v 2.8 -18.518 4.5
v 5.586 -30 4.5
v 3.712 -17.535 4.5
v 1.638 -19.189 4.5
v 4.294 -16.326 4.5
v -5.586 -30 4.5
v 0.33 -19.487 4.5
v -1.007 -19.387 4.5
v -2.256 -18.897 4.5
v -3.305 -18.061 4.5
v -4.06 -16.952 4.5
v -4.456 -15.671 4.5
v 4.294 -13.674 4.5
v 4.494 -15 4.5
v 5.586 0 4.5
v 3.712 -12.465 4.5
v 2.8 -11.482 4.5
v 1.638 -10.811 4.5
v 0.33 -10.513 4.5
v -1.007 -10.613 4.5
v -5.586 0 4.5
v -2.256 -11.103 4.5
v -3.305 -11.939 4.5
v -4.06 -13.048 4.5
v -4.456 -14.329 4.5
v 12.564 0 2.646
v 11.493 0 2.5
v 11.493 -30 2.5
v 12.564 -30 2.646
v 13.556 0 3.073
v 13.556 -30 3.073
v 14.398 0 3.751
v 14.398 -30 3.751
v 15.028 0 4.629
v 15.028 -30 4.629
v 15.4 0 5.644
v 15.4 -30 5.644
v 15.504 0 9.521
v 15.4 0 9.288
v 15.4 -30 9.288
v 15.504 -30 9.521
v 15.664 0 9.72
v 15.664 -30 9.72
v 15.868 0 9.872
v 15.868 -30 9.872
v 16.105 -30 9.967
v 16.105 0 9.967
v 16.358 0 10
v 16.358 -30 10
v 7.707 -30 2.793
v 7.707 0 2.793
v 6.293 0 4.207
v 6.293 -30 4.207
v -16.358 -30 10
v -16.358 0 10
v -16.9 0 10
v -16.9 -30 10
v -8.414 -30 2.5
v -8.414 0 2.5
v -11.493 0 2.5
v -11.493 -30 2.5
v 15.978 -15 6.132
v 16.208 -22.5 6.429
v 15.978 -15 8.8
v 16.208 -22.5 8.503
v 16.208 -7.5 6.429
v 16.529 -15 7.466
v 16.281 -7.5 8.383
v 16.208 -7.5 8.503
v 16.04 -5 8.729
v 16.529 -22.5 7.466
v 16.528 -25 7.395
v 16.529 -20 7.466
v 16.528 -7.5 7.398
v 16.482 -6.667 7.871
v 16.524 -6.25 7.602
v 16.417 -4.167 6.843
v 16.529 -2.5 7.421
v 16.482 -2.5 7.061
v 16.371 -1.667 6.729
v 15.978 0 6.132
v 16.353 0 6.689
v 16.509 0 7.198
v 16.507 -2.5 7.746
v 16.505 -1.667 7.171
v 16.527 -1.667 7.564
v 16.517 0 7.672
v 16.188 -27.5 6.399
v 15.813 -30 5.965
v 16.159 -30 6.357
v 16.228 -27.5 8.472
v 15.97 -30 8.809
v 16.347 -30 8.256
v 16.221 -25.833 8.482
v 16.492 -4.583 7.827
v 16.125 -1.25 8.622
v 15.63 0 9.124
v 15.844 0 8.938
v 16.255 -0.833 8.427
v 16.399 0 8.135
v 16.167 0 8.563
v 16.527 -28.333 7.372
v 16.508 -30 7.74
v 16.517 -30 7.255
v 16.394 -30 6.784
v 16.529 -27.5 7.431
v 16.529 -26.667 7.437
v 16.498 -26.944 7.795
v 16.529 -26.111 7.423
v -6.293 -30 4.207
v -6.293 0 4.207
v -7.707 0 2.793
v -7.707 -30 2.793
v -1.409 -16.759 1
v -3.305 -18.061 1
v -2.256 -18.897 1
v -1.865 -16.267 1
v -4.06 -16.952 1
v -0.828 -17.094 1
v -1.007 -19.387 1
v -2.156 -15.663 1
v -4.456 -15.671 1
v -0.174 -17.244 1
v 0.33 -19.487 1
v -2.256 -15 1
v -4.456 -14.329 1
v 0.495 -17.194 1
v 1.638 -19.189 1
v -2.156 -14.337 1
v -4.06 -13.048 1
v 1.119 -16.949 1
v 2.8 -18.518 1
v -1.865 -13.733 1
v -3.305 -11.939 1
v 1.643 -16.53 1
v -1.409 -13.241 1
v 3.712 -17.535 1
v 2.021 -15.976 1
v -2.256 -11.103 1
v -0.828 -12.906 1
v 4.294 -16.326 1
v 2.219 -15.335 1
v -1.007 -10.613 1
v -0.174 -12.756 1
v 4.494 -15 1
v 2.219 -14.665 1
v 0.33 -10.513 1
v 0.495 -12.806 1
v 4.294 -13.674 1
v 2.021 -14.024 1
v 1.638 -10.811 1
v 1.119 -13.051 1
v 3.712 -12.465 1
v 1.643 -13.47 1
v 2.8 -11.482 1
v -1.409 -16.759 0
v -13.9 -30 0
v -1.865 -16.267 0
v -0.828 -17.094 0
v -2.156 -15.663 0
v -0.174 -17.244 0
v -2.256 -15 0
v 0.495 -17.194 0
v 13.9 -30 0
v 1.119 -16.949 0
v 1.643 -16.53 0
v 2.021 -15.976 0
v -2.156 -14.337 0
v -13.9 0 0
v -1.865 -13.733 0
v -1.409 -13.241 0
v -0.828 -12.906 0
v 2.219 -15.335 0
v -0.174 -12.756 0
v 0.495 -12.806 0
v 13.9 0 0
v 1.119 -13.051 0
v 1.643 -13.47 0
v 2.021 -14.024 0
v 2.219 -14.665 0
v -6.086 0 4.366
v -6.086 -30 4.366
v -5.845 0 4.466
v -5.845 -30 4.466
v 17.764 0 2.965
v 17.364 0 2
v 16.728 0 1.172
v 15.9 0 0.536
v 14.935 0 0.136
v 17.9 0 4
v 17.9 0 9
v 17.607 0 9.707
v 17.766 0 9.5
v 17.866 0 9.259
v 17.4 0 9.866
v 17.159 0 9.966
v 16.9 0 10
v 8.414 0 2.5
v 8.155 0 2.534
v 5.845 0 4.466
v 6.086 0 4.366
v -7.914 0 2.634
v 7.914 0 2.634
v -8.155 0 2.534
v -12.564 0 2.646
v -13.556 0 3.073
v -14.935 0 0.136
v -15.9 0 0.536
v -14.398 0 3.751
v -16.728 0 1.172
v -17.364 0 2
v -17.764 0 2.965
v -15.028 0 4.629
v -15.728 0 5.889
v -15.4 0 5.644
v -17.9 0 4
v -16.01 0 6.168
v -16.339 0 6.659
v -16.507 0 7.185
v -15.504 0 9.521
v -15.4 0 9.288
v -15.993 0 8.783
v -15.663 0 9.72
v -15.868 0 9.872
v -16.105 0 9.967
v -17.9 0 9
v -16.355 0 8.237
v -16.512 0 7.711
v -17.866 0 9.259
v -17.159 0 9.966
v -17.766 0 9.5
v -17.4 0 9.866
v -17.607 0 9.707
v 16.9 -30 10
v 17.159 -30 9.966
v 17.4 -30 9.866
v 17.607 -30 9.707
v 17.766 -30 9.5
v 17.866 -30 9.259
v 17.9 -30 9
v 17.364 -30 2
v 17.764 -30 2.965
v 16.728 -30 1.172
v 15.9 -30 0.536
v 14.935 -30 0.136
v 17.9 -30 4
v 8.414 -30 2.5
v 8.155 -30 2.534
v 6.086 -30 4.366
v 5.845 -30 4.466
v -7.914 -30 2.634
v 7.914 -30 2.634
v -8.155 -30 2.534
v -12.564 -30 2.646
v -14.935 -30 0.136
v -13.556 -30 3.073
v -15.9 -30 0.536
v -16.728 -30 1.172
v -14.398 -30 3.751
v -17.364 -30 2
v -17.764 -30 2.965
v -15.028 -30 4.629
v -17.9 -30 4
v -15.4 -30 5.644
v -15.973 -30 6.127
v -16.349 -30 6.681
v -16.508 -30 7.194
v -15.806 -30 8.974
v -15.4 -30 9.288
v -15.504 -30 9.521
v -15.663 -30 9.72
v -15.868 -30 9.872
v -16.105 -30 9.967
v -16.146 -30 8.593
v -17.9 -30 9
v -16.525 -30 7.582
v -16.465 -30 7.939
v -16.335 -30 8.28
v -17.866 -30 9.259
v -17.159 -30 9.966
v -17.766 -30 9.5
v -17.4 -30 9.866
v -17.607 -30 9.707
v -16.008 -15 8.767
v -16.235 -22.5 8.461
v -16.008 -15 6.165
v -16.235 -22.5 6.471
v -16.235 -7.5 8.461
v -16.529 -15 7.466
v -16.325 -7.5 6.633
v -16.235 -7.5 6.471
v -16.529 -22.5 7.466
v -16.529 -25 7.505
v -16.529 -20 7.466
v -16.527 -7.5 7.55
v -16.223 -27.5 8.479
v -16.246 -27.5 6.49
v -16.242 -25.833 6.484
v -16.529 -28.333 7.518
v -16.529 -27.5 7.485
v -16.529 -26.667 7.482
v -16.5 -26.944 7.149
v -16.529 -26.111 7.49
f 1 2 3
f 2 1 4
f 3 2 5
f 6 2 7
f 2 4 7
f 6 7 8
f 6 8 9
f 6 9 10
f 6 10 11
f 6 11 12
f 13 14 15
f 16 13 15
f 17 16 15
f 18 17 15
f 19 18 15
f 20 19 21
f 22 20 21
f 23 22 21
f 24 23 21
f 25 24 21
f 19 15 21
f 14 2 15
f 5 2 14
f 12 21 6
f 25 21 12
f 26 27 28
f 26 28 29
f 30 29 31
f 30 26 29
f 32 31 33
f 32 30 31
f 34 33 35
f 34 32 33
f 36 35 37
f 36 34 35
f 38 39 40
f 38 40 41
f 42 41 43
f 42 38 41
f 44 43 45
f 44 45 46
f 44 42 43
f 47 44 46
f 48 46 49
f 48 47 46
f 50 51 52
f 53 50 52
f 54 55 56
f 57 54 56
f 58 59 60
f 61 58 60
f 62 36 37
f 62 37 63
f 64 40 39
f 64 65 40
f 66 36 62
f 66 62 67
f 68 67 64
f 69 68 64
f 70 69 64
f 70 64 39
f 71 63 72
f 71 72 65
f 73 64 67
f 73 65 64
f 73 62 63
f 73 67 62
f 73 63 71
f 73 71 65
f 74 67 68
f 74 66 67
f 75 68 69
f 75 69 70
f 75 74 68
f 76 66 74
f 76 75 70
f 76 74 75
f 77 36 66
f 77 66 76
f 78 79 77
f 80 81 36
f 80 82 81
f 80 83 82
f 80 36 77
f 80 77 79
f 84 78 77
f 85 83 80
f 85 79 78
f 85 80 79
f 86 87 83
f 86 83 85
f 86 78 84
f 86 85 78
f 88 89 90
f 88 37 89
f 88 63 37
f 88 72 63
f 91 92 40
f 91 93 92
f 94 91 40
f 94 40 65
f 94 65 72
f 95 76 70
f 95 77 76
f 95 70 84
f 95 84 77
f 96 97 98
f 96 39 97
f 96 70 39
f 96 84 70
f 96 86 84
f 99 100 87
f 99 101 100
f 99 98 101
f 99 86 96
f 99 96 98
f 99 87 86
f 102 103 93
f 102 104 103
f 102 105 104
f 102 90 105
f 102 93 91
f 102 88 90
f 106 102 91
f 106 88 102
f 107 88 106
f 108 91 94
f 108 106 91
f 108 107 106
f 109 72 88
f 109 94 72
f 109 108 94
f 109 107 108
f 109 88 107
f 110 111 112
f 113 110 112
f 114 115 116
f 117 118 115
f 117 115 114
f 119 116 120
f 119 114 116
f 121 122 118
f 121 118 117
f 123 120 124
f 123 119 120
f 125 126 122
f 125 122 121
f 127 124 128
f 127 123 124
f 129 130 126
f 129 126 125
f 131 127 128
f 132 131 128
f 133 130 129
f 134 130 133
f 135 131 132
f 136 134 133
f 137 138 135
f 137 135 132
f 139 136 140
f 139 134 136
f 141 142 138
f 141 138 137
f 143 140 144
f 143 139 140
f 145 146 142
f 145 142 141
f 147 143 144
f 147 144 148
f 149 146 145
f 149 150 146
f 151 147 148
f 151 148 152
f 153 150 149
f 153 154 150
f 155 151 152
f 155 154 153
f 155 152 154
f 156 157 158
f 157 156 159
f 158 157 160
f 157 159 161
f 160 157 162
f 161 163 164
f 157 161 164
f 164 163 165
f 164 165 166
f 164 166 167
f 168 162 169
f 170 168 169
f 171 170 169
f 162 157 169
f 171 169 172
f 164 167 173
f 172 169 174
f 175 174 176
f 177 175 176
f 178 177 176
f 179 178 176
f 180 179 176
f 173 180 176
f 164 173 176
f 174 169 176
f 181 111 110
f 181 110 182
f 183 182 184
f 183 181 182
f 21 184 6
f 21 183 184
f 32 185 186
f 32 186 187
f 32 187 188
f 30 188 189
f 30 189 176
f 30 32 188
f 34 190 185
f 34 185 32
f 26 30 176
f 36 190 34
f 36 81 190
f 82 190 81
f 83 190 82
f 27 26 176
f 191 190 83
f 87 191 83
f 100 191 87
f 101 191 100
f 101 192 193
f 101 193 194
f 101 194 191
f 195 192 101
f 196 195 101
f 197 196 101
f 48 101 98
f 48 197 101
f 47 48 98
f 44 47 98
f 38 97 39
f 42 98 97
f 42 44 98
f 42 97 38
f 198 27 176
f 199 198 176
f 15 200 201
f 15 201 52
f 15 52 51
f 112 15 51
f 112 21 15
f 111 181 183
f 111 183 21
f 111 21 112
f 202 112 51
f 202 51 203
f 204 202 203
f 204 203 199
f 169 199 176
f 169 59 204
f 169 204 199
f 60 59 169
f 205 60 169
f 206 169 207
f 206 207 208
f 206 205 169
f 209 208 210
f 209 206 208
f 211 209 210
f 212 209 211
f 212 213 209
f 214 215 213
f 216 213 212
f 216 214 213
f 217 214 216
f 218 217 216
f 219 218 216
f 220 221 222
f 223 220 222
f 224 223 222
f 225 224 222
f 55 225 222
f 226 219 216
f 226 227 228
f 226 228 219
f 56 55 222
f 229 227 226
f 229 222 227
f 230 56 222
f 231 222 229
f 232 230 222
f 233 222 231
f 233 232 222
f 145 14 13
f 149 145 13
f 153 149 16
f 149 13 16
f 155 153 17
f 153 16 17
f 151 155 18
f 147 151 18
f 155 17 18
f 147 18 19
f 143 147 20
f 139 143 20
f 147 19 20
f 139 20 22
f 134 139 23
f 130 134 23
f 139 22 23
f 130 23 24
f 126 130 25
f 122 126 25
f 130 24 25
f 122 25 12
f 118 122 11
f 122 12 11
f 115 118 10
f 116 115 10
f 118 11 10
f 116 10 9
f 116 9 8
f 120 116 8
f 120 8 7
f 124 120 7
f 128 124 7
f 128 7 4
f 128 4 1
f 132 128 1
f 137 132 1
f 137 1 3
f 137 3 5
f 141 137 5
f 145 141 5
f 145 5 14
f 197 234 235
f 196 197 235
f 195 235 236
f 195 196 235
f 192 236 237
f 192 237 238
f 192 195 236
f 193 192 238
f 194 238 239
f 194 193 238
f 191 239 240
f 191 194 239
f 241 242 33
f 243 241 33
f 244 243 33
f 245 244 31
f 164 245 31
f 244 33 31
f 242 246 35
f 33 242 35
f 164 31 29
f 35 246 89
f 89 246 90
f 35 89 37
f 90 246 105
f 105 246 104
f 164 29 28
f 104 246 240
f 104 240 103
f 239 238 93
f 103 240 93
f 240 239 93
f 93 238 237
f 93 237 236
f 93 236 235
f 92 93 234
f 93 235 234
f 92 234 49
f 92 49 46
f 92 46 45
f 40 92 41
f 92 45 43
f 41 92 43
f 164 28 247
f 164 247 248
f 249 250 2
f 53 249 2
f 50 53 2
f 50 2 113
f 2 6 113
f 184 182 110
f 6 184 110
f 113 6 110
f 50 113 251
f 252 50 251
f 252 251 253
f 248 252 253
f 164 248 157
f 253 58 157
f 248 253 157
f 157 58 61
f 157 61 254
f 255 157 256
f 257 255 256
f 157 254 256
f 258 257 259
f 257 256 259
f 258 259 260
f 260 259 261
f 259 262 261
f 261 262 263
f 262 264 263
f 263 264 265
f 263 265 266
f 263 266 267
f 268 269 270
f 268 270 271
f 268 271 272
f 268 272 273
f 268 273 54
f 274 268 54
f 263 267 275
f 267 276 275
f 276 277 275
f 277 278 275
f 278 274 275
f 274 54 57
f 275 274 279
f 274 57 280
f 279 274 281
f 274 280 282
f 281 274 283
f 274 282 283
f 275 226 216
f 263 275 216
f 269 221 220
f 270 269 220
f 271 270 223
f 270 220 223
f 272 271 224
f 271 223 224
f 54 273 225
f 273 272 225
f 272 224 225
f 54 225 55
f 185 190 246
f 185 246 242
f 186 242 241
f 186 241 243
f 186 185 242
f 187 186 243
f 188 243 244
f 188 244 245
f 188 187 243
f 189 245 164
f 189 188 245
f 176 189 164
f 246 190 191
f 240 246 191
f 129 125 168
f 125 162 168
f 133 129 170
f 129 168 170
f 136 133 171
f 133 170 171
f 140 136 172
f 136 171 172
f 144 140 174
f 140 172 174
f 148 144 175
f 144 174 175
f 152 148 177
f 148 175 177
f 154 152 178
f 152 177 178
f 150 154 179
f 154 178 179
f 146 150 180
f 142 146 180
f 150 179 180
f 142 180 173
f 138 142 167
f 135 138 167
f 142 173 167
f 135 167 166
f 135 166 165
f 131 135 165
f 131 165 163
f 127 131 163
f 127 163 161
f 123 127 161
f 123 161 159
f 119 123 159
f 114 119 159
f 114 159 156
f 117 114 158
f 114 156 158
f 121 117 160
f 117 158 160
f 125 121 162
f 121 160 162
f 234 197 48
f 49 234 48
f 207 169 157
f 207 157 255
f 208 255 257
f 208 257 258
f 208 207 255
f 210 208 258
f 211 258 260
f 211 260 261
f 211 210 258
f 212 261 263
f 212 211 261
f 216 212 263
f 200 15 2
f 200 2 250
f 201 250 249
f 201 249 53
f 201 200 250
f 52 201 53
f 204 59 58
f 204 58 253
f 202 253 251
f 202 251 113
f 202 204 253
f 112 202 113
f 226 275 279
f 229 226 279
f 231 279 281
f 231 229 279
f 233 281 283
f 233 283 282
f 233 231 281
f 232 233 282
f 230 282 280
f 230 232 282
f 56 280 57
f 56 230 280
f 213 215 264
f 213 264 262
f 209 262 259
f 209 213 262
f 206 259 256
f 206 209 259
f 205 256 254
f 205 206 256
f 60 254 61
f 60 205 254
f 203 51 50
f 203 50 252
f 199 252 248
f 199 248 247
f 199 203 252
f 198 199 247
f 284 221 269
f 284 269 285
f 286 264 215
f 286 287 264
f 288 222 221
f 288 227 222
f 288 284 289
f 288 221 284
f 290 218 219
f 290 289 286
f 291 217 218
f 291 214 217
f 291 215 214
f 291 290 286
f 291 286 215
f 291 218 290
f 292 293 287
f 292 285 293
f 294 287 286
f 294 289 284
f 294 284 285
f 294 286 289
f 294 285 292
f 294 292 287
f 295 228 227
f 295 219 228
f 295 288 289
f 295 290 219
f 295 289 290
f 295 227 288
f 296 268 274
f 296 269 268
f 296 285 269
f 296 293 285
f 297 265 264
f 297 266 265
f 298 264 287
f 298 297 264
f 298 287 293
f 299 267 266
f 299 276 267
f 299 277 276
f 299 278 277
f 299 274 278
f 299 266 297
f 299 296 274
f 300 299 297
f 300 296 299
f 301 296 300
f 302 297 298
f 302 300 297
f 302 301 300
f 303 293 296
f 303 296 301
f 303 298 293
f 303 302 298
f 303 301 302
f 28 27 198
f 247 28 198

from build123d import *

# Parameters (mm, degrees)
F1_DEPTH       = 30
F3_D           = 4.5
F3_CBORE_D     = 9
F3_CBORE_DEPTH = 3.5
F4_DEPTH       = 30.0010001
F5_T1_DEPTH    = 30
F5_T3_DEPTH    = 30
F5_T5_DEPTH    = 34.788525759
F5_T7_DEPTH    = 35
F5_T9_DEPTH    = 32.0710678119
F5_T11_DEPTH   = 32.0710678119
F5_T13_DEPTH   = 34.7881858635
F5_T15_DEPTH   = 35
F6_T1_DEPTH    = 30
F6_T3_DEPTH    = 30
F6_T5_DEPTH    = 50
F6_T7_DEPTH    = 50


# Not quite as in the source:
# - a fillet or chamfer that OpenCascade refuses, or shapes differently, is made with other operations: its cross-section is extruded or revolved along the edge and cut away or added


with BuildPart() as f1:
    # F0 (on Front) → F1 (new body)
    with BuildSketch(Plane.XZ):
        with BuildLine():
            Line((-17.9, 10), (-17.9, 0))
            Line((-17.9, 0), (17.9, 0))
            Line((17.9, 0), (17.9, 10))
            Line((17.9, 10), (15.4, 10))
            Line((15.4, 10), (15.4, 9.2879775086))
            add(Edge.make_bspline(
                [(15.4, 5.6440113938), (18.1981581314, 7.4659944512), (15.4, 9.2879775086)],
                knots=[2.3143184253, 2.3143184253, 2.3143184253, 3.9688668818, 3.9688668818, 3.9688668818], degree=2, weights=[1, 0.676884683, 1]))
            Line((15.4, 5.6440113938), (15.4, 2.5))
            Line((15.4, 2.5), (8, 2.5))
            Line((8, 2.5), (6, 4.5))
            Line((6, 4.5), (-6, 4.5))
            Line((-6, 4.5), (-8, 2.5))
            Line((-8, 2.5), (-15.4, 2.5))
            Line((-15.4, 2.5), (-15.4, 5.6442375475))
            add(Edge.make_bspline(
                [(-16.5293519812, 7.4659944512), (-16.5293519812, 6.3796188728), (-15.4, 5.6442375475)],
                knots=[0, 0, 0, 0.8272362915, 0.8272362915, 0.8272362915], degree=2, weights=[1, 0.9156725963, 1]))
            add(Edge.make_bspline(
                [(-15.4, 9.2877513548), (-16.5293519812, 8.5523700296), (-16.5293519812, 7.4659944512)],
                knots=[5.4559490157, 5.4559490157, 5.4559490157, 6.2831853072, 6.2831853072, 6.2831853072], degree=2, weights=[1, 0.9156725963, 1]))
            Line((-15.4, 9.2877513548), (-15.4, 10))
            Line((-15.4, 10), (-17.9, 10))
        make_face()
        with BuildLine():
            add(Edge.make_bspline(
                [(-15.4, 5.6442375475), (-9.5383519812, 1.8274058066), (-9.5383519812, 7.4659944512), (-9.5383519812, 13.1045830958), (-15.4, 9.2877513548)],
                knots=[0.8272362915, 0.8272362915, 0.8272362915, 3.1415926536, 3.1415926536, 5.4559490157, 5.4559490157, 5.4559490157], degree=2, weights=[1, 0.4019249885, 1, 0.4019249885, 1]))
            Line((-15.4, 9.2877513548), (-15.4, 5.6442375475))
        make_face()
        with BuildLine():
            Line((-15.4, 5.6442375475), (-15.4, 9.2877513548))
            add(Edge.make_bspline(
                [(-15.4, 9.2877513548), (-16.5293519812, 8.5523700296), (-16.5293519812, 7.4659944512)],
                knots=[5.4559490157, 5.4559490157, 5.4559490157, 6.2831853072, 6.2831853072, 6.2831853072], degree=2, weights=[1, 0.9156725963, 1]))
            add(Edge.make_bspline(
                [(-16.5293519812, 7.4659944512), (-16.5293519812, 6.3796188728), (-15.4, 5.6442375475)],
                knots=[0, 0, 0, 0.8272362915, 0.8272362915, 0.8272362915], degree=2, weights=[1, 0.9156725963, 1]))
        make_face()
        with BuildLine():
            add(Edge.make_bspline(
                [(15.4, 5.6440113938), (18.1981581314, 7.4659944512), (15.4, 9.2879775086)],
                knots=[2.3143184253, 2.3143184253, 2.3143184253, 3.9688668818, 3.9688668818, 3.9688668818], degree=2, weights=[1, 0.676884683, 1]))
            Line((15.4, 9.2879775086), (15.4, 5.6440113938))
        make_face()
        with BuildLine():
            Line((15.4, 5.6440113938), (15.4, 9.2879775086))
            add(Edge.make_bspline(
                [(15.4, 9.2879775086), (9.5382216203, 13.1047957127), (9.5382216203, 7.4659944512)],
                knots=[3.9688668818, 3.9688668818, 3.9688668818, 6.2831853072, 6.2831853072, 6.2831853072], degree=2, weights=[1, 0.4019423572, 1]))
            add(Edge.make_bspline(
                [(9.5382216203, 7.4659944512), (9.5382216203, 1.8271931896), (15.4, 5.6440113938)],
                knots=[0, 0, 0, 2.3143184253, 2.3143184253, 2.3143184253], degree=2, weights=[1, 0.4019423572, 1]))
        make_face()
    extrude(amount=F1_DEPTH)

    # F3 (through all)
    with Locations(Plane.XY.offset(4.5)):
        with Locations((-0.0060852617, -15)):
            CounterBoreHole(F3_D / 2, F3_CBORE_D / 2, F3_CBORE_DEPTH)

    # F0 (on Front) → F4 (cut, through all)
    with BuildSketch(Plane.XZ):
        with BuildLine():
            Line((15.4, 5.6440113938), (15.4, 9.2879775086))
            add(Edge.make_bspline(
                [(15.4, 9.2879775086), (9.5382216203, 13.1047957127), (9.5382216203, 7.4659944512)],
                knots=[3.9688668818, 3.9688668818, 3.9688668818, 6.2831853072, 6.2831853072, 6.2831853072], degree=2, weights=[1, 0.4019423572, 1]))
            add(Edge.make_bspline(
                [(9.5382216203, 7.4659944512), (9.5382216203, 1.8271931896), (15.4, 5.6440113938)],
                knots=[0, 0, 0, 2.3143184253, 2.3143184253, 2.3143184253], degree=2, weights=[1, 0.4019423572, 1]))
        make_face()
        with BuildLine():
            add(Edge.make_bspline(
                [(15.4, 5.6440113938), (18.1981581314, 7.4659944512), (15.4, 9.2879775086)],
                knots=[2.3143184253, 2.3143184253, 2.3143184253, 3.9688668818, 3.9688668818, 3.9688668818], degree=2, weights=[1, 0.676884683, 1]))
            Line((15.4, 9.2879775086), (15.4, 5.6440113938))
        make_face()
        with BuildLine():
            add(Edge.make_bspline(
                [(-15.4, 5.6442375475), (-9.5383519812, 1.8274058066), (-9.5383519812, 7.4659944512), (-9.5383519812, 13.1045830958), (-15.4, 9.2877513548)],
                knots=[0.8272362915, 0.8272362915, 0.8272362915, 3.1415926536, 3.1415926536, 5.4559490157, 5.4559490157, 5.4559490157], degree=2, weights=[1, 0.4019249885, 1, 0.4019249885, 1]))
            Line((-15.4, 9.2877513548), (-15.4, 5.6442375475))
        make_face()
        with BuildLine():
            Line((-15.4, 5.6442375475), (-15.4, 9.2877513548))
            add(Edge.make_bspline(
                [(-15.4, 9.2877513548), (-16.5293519812, 8.5523700296), (-16.5293519812, 7.4659944512)],
                knots=[5.4559490157, 5.4559490157, 5.4559490157, 6.2831853072, 6.2831853072, 6.2831853072], degree=2, weights=[1, 0.9156725963, 1]))
            add(Edge.make_bspline(
                [(-16.5293519812, 7.4659944512), (-16.5293519812, 6.3796188728), (-15.4, 5.6442375475)],
                knots=[0, 0, 0, 0.8272362915, 0.8272362915, 0.8272362915], degree=2, weights=[1, 0.9156725963, 1]))
        make_face()
    extrude(amount=F4_DEPTH, mode=Mode.SUBTRACT)

    # F5: fillet of radius 1 on 8 edges, made by hand

    # F5_s2 → F5_t1 (join)
    with BuildSketch(Plane.XZ):
        with BuildLine():
            ThreePointArc((-8.4142135624, 2.5), (-8.03153013, 2.5761204675), (-7.7071067812, 2.7928932188))
            Line((-7.7071067812, 2.7928932188), (-7.6929646456, 2.7787510832))
            Line((-7.6929646456, 2.7787510832), (-7.9917157288, 2.48))
            Line((-7.9917157288, 2.48), (-8.4142135624, 2.48))
            Line((-8.4142135624, 2.48), (-8.4142135624, 2.5))
        make_face()
    extrude(amount=F5_T1_DEPTH)

    # F5_s4 → F5_t3 (join)
    with BuildSketch(Plane.XZ):
        with BuildLine():
            ThreePointArc((7.7071067812, 2.7928932188), (8.03153013, 2.5761204675), (8.4142135624, 2.5))
            Line((8.4142135624, 2.5), (8.4142135624, 2.48))
            Line((8.4142135624, 2.48), (7.9917157288, 2.48))
            Line((7.9917157288, 2.48), (7.6929646456, 2.7787510832))
            Line((7.6929646456, 2.7787510832), (7.7071067812, 2.7928932188))
        make_face()
    extrude(amount=F5_T3_DEPTH)

    # F5_s6 → F5_t5 (cut)
    with BuildSketch(Plane.XZ.offset(-2.3942628795)):
        with BuildLine():
            ThreePointArc((-15.4, 9.2877513548), (-15.7609436227, 9.8024186422), (-16.3577051518, 10))
            Line((-16.3577051518, 10), (-16.3577051518, 10.02))
            Line((-16.3577051518, 10.02), (-15.4, 10.02))
            Line((-15.4, 10.02), (-15.38, 10))
            ThreePointArc((-15.38, 10), (-15.38, 9.6438756774), (-15.380845897, 9.2935063819))
            Line((-15.380845897, 9.2935063819), (-15.4, 9.2877513548))
        make_face()
    extrude(amount=F5_T5_DEPTH, mode=Mode.SUBTRACT)

    # F5_s8 → F5_t7 (cut)
    with BuildSketch(Plane.XZ.offset(-2.5)):
        with BuildLine():
            ThreePointArc((-17.9, 9), (-17.6071067812, 9.7071067812), (-16.9, 10))
            Line((-16.9, 10), (-16.9, 10.02))
            Line((-16.9, 10.02), (-17.92, 10.02))
            Line((-17.92, 10.02), (-17.92, 9))
            Line((-17.92, 9), (-17.9, 9))
        make_face()
    extrude(amount=F5_T7_DEPTH, mode=Mode.SUBTRACT)

    # F5_s10 → F5_t9 (cut)
    with BuildSketch(Plane.XZ.offset(-1.0355339059)):
        with BuildLine():
            ThreePointArc((-6.2928932188, 4.2071067812), (-5.96846987, 4.4238795325), (-5.5857864376, 4.5))
            Line((-5.5857864376, 4.5), (-5.5857864376, 4.52))
            Line((-5.5857864376, 4.52), (-6.0082842712, 4.52))
            Line((-6.0082842712, 4.52), (-6.3070353544, 4.2212489168))
            Line((-6.3070353544, 4.2212489168), (-6.2928932188, 4.2071067812))
        make_face()
    extrude(amount=F5_T9_DEPTH, mode=Mode.SUBTRACT)

    # F5_s12 → F5_t11 (cut)
    with BuildSketch(Plane.XZ.offset(-1.0355339059)):
        with BuildLine():
            ThreePointArc((5.5857864376, 4.5), (5.96846987, 4.4238795325), (6.2928932188, 4.2071067812))
            Line((6.2928932188, 4.2071067812), (6.3070353544, 4.2212489168))
            Line((6.3070353544, 4.2212489168), (6.0082842712, 4.52))
            Line((6.0082842712, 4.52), (5.5857864376, 4.52))
            Line((5.5857864376, 4.52), (5.5857864376, 4.5))
        make_face()
    extrude(amount=F5_T11_DEPTH, mode=Mode.SUBTRACT)

    # F5_s14 → F5_t13 (cut)
    with BuildSketch(Plane.XZ.offset(-2.3940929318)):
        with BuildLine():
            ThreePointArc((15.4, 9.2879775086), (15.7609703932, 9.8024890992), (16.3576371727, 10))
            Line((16.3576371727, 10), (16.3576371727, 10.02))
            Line((16.3576371727, 10.02), (15.4, 10.02))
            Line((15.4, 10.02), (15.38, 10))
            ThreePointArc((15.38, 10), (15.38, 9.6439887543), (15.3808472565, 9.2937370588))
            Line((15.3808472565, 9.2937370588), (15.4, 9.2879775086))
        make_face()
    extrude(amount=F5_T13_DEPTH, mode=Mode.SUBTRACT)

    # F5_s16 → F5_t15 (cut)
    with BuildSketch(Plane.XZ.offset(-2.5)):
        with BuildLine():
            ThreePointArc((16.9, 10), (17.6071067812, 9.7071067812), (17.9, 9))
            Line((17.9, 9), (17.92, 9))
            Line((17.92, 9), (17.92, 10.02))
            Line((17.92, 10.02), (16.9, 10.02))
            Line((16.9, 10.02), (16.9, 10))
        make_face()
    extrude(amount=F5_T15_DEPTH, mode=Mode.SUBTRACT)

    # F6: fillet of radius 4 on 4 edges, made by hand

    # F6_s2 → F6_t1 (join)
    with BuildSketch(Plane.XZ):
        with BuildLine():
            ThreePointArc((-15.4, 5.6442375475), (-14.000296538, 3.3836680368), (-11.4926133254, 2.5))
            Line((-11.4926133254, 2.5), (-11.4926133254, 2.42))
            Line((-11.4926133254, 2.42), (-15.4, 2.42))
            Line((-15.4, 2.42), (-15.48, 2.5))
            ThreePointArc((-15.48, 2.5), (-15.48, 4.0721187738), (-15.4781477335, 5.6271222985))
            Line((-15.4781477335, 5.6271222985), (-15.4, 5.6442375475))
        make_face()
    extrude(amount=F6_T1_DEPTH)

    # F6_s4 → F6_t3 (join)
    with BuildSketch(Plane.XZ):
        with BuildLine():
            ThreePointArc((11.4926628625, 2.5), (14.0002558892, 3.3835954671), (15.4, 5.6440113938))
            Line((15.4, 5.6440113938), (15.4781467427, 5.6268916217))
            ThreePointArc((15.4781467427, 5.6268916217), (15.48, 4.0720056969), (15.48, 2.5))
            Line((15.48, 2.5), (15.4, 2.42))
            Line((15.4, 2.42), (11.4926628625, 2.42))
            Line((11.4926628625, 2.42), (11.4926628625, 2.5))
        make_face()
    extrude(amount=F6_T3_DEPTH)

    # F6_s6 → F6_t5 (cut)
    with BuildSketch(Plane.XZ.offset(-10)):
        with BuildLine():
            ThreePointArc((17.9, 4), (16.7284271247, 1.1715728753), (13.9, 0))
            Line((13.9, 0), (13.9, -0.08))
            Line((13.9, -0.08), (17.98, -0.08))
            Line((17.98, -0.08), (17.98, 4))
            Line((17.98, 4), (17.9, 4))
        make_face()
    extrude(amount=F6_T5_DEPTH, mode=Mode.SUBTRACT)

    # F6_s8 → F6_t7 (cut)
    with BuildSketch(Plane.XZ.offset(-10)):
        with BuildLine():
            ThreePointArc((-13.9, 0), (-16.7284271247, 1.1715728753), (-17.9, 4))
            Line((-17.9, 4), (-17.98, 4))
            Line((-17.98, 4), (-17.98, -0.08))
            Line((-17.98, -0.08), (-13.9, -0.08))
            Line((-13.9, -0.08), (-13.9, 0))
        make_face()
    extrude(amount=F6_T7_DEPTH, mode=Mode.SUBTRACT)


solid = f1.part
